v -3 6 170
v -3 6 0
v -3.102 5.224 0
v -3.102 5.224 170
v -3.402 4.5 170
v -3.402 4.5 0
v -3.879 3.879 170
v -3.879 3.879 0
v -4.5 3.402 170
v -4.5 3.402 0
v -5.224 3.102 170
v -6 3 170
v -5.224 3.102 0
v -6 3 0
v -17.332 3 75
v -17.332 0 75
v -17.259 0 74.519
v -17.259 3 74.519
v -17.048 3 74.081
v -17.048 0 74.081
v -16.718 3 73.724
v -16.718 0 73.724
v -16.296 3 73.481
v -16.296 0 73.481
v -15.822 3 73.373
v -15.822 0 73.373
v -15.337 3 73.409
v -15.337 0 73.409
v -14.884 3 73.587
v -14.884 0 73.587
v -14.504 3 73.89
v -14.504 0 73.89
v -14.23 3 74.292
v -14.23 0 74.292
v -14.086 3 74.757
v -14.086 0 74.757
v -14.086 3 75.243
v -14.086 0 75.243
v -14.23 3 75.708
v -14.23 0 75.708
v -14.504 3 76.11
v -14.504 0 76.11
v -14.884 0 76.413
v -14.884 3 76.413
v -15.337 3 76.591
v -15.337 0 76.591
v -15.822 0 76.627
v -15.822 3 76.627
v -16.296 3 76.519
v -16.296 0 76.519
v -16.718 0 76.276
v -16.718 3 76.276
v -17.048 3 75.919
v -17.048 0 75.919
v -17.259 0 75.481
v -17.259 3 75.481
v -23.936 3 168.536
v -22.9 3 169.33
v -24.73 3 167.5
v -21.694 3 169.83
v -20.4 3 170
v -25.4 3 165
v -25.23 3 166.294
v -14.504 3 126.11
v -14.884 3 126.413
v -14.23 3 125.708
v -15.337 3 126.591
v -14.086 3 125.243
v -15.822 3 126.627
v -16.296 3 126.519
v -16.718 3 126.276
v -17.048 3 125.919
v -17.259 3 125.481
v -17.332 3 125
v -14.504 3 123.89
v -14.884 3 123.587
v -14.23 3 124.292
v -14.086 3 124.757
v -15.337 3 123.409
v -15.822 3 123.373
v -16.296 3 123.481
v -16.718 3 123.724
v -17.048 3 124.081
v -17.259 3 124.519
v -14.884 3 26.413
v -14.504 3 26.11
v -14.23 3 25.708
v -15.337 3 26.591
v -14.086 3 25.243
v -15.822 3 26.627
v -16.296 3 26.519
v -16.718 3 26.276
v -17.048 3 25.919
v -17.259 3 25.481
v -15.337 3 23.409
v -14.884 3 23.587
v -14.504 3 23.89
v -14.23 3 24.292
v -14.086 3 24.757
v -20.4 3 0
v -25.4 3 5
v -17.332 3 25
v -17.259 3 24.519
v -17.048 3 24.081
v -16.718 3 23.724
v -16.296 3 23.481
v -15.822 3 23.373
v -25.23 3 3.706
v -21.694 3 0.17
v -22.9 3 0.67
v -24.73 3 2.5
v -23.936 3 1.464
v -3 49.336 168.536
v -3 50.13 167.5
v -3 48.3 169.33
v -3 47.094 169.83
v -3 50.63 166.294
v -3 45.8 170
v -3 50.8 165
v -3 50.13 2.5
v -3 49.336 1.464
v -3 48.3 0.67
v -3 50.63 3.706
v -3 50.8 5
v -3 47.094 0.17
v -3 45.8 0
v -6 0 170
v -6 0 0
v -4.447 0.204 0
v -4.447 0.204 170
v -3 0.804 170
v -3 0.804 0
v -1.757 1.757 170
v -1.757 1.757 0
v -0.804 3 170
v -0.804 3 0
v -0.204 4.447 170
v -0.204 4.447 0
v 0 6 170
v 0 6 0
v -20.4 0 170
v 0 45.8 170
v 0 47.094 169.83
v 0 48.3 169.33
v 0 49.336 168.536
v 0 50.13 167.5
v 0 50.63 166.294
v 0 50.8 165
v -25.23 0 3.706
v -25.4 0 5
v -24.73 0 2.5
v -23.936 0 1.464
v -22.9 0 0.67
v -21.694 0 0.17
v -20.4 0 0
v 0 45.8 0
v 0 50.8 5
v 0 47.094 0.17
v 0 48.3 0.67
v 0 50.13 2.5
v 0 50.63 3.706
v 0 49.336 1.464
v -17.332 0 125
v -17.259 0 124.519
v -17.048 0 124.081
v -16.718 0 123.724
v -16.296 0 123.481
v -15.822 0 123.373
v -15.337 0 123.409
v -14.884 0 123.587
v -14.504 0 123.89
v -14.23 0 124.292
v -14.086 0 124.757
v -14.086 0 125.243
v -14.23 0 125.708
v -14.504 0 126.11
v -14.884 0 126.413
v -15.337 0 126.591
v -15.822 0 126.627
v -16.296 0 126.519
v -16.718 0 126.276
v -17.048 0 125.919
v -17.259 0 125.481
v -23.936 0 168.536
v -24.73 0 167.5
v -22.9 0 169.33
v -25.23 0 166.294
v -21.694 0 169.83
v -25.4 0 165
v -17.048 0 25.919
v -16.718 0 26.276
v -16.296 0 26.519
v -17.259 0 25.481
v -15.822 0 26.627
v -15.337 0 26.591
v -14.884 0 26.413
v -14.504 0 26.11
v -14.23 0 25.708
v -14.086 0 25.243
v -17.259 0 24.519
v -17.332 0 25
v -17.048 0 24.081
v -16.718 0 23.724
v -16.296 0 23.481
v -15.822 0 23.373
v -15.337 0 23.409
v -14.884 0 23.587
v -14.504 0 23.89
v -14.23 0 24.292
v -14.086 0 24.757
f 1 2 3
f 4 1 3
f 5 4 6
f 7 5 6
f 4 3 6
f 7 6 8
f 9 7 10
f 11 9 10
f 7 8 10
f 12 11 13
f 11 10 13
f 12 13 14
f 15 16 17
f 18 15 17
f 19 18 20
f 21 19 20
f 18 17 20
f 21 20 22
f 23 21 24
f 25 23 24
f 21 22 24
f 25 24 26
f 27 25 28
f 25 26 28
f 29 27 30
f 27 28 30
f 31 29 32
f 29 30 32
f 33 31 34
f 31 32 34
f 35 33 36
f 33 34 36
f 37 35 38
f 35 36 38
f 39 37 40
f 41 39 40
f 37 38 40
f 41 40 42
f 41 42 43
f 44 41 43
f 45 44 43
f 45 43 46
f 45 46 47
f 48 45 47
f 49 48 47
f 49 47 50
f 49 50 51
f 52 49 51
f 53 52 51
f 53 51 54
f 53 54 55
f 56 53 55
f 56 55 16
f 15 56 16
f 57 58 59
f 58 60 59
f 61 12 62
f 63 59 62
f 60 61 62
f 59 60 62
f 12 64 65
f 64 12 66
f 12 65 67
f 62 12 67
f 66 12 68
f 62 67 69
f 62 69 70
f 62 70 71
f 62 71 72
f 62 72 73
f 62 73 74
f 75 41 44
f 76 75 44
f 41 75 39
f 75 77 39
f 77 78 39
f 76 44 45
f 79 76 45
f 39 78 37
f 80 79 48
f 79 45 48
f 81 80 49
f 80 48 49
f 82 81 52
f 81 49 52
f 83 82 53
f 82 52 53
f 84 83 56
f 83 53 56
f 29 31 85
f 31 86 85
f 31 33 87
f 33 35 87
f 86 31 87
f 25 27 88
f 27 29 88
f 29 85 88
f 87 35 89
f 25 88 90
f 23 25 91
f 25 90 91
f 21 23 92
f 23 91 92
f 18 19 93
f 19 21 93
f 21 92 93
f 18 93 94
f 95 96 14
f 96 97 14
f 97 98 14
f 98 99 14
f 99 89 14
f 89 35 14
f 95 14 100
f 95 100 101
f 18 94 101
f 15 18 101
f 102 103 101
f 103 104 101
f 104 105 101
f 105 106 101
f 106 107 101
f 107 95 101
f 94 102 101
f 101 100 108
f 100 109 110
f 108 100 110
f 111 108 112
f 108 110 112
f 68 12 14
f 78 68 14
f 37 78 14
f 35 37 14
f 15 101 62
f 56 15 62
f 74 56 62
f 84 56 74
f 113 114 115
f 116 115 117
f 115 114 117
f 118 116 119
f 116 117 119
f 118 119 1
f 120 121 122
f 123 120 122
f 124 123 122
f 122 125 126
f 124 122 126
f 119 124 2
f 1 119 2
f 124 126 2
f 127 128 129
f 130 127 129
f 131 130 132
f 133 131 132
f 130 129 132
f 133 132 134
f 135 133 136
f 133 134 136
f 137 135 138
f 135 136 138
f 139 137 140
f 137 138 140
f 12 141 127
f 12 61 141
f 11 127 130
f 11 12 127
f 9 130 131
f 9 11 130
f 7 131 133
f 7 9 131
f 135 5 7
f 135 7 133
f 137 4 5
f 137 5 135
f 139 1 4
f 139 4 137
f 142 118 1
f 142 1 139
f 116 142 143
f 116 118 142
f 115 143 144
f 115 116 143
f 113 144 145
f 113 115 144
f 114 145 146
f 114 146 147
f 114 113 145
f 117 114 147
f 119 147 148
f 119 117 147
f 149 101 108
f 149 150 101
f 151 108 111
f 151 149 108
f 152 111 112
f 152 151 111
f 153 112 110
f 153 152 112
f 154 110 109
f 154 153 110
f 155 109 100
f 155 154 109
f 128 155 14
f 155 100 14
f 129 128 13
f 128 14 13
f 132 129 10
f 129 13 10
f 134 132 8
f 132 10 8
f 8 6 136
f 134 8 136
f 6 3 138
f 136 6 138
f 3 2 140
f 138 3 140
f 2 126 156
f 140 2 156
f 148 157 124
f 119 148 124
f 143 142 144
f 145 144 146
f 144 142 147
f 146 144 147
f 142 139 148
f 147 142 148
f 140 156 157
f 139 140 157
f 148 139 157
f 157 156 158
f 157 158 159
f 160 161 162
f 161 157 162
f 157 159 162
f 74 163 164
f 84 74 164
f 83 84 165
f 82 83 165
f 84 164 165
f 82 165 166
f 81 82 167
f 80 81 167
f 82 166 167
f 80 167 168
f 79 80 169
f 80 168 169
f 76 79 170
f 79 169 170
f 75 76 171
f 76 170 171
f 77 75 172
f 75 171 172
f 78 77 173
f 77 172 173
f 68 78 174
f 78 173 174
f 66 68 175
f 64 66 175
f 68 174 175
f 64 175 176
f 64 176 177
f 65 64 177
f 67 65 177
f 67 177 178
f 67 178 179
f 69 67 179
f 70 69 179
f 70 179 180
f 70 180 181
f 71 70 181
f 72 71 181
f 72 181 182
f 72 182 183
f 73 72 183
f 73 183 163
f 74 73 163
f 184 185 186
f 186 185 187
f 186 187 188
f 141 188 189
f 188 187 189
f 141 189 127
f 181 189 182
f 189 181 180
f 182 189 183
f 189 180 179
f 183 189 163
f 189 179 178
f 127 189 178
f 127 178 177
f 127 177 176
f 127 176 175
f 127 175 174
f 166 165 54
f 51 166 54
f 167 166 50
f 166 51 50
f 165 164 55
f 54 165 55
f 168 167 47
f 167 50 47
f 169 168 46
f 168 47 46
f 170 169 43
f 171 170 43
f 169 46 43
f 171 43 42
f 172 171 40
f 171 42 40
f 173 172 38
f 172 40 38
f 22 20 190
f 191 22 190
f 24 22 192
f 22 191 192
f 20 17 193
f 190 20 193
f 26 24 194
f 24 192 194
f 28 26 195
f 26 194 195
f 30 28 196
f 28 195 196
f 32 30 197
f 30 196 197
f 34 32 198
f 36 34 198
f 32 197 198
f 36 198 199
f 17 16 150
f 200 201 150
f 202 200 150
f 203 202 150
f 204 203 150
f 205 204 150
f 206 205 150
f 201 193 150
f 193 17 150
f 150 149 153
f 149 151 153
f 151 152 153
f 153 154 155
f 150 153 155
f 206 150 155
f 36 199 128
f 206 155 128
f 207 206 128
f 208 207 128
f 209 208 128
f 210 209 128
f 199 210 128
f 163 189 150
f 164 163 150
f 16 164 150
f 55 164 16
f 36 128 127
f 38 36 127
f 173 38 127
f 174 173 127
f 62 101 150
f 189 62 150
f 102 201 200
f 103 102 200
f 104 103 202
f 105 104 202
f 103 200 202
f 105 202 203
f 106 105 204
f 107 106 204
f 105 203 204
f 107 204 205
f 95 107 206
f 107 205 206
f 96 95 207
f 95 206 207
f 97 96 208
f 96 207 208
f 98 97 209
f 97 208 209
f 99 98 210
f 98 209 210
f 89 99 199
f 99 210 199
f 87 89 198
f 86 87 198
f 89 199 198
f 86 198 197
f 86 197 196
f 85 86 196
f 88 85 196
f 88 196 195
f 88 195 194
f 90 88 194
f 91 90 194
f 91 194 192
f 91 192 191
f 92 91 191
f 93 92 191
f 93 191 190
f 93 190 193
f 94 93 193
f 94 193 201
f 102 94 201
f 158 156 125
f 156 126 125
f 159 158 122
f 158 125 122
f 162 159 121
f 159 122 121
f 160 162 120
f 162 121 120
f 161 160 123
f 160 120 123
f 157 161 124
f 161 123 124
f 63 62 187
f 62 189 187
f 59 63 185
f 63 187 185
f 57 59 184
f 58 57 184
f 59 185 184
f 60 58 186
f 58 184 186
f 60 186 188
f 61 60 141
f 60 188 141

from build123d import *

# Parameters (mm, degrees)
BASE_FLANGE1_DEPTH           = 170
F_30_0_1285_DIAMETER_HOLE1_D = 3.2639
FILLET1_R                    = 5


# Sheet-metal steps are written as plain solids
with BuildPart() as part:
    # Sketch1 → Base-Flange1 (new body)
    with BuildSketch(Plane.XY):
        with BuildLine():
            Line((-25.4, 0), (-6, 0))
            ThreePointArc((-6, 0), (-1.757359313, 1.757359313), (0, 6))
            Line((0, 6), (0, 50.8))
            Line((0, 50.8), (-3, 50.8))
            Line((-3, 50.8), (-3, 6))
            ThreePointArc((-3, 6), (-3.878679656, 3.878679656), (-6, 3))
            Line((-6, 3), (-25.4, 3))
            Line((-25.4, 3), (-25.4, 0))
        make_face()
    extrude(amount=BASE_FLANGE1_DEPTH)

    # #30 (0.1285) Diameter Hole1 (through all)
    with Locations(Plane(origin=(0, 3, 0), x_dir=(1, 0, 0), z_dir=(0, 1, 0))):
        with Locations((-15.7, -25), (-15.7, -75), (-15.7, -125)):
            Hole(F_30_0_1285_DIAMETER_HOLE1_D / 2)

    # Fillet1
    fillet1_edges = [part.edges().sort_by_distance(p)[0] for p in [
        (-1.5, 50.8, 170),
        (-1.5, 50.8, 0),
        (-25.4, 1.5, 170),
        (-25.4, 1.5, 0),
    ]]
    fillet(fillet1_edges, radius=FILLET1_R)


solid = part.part
